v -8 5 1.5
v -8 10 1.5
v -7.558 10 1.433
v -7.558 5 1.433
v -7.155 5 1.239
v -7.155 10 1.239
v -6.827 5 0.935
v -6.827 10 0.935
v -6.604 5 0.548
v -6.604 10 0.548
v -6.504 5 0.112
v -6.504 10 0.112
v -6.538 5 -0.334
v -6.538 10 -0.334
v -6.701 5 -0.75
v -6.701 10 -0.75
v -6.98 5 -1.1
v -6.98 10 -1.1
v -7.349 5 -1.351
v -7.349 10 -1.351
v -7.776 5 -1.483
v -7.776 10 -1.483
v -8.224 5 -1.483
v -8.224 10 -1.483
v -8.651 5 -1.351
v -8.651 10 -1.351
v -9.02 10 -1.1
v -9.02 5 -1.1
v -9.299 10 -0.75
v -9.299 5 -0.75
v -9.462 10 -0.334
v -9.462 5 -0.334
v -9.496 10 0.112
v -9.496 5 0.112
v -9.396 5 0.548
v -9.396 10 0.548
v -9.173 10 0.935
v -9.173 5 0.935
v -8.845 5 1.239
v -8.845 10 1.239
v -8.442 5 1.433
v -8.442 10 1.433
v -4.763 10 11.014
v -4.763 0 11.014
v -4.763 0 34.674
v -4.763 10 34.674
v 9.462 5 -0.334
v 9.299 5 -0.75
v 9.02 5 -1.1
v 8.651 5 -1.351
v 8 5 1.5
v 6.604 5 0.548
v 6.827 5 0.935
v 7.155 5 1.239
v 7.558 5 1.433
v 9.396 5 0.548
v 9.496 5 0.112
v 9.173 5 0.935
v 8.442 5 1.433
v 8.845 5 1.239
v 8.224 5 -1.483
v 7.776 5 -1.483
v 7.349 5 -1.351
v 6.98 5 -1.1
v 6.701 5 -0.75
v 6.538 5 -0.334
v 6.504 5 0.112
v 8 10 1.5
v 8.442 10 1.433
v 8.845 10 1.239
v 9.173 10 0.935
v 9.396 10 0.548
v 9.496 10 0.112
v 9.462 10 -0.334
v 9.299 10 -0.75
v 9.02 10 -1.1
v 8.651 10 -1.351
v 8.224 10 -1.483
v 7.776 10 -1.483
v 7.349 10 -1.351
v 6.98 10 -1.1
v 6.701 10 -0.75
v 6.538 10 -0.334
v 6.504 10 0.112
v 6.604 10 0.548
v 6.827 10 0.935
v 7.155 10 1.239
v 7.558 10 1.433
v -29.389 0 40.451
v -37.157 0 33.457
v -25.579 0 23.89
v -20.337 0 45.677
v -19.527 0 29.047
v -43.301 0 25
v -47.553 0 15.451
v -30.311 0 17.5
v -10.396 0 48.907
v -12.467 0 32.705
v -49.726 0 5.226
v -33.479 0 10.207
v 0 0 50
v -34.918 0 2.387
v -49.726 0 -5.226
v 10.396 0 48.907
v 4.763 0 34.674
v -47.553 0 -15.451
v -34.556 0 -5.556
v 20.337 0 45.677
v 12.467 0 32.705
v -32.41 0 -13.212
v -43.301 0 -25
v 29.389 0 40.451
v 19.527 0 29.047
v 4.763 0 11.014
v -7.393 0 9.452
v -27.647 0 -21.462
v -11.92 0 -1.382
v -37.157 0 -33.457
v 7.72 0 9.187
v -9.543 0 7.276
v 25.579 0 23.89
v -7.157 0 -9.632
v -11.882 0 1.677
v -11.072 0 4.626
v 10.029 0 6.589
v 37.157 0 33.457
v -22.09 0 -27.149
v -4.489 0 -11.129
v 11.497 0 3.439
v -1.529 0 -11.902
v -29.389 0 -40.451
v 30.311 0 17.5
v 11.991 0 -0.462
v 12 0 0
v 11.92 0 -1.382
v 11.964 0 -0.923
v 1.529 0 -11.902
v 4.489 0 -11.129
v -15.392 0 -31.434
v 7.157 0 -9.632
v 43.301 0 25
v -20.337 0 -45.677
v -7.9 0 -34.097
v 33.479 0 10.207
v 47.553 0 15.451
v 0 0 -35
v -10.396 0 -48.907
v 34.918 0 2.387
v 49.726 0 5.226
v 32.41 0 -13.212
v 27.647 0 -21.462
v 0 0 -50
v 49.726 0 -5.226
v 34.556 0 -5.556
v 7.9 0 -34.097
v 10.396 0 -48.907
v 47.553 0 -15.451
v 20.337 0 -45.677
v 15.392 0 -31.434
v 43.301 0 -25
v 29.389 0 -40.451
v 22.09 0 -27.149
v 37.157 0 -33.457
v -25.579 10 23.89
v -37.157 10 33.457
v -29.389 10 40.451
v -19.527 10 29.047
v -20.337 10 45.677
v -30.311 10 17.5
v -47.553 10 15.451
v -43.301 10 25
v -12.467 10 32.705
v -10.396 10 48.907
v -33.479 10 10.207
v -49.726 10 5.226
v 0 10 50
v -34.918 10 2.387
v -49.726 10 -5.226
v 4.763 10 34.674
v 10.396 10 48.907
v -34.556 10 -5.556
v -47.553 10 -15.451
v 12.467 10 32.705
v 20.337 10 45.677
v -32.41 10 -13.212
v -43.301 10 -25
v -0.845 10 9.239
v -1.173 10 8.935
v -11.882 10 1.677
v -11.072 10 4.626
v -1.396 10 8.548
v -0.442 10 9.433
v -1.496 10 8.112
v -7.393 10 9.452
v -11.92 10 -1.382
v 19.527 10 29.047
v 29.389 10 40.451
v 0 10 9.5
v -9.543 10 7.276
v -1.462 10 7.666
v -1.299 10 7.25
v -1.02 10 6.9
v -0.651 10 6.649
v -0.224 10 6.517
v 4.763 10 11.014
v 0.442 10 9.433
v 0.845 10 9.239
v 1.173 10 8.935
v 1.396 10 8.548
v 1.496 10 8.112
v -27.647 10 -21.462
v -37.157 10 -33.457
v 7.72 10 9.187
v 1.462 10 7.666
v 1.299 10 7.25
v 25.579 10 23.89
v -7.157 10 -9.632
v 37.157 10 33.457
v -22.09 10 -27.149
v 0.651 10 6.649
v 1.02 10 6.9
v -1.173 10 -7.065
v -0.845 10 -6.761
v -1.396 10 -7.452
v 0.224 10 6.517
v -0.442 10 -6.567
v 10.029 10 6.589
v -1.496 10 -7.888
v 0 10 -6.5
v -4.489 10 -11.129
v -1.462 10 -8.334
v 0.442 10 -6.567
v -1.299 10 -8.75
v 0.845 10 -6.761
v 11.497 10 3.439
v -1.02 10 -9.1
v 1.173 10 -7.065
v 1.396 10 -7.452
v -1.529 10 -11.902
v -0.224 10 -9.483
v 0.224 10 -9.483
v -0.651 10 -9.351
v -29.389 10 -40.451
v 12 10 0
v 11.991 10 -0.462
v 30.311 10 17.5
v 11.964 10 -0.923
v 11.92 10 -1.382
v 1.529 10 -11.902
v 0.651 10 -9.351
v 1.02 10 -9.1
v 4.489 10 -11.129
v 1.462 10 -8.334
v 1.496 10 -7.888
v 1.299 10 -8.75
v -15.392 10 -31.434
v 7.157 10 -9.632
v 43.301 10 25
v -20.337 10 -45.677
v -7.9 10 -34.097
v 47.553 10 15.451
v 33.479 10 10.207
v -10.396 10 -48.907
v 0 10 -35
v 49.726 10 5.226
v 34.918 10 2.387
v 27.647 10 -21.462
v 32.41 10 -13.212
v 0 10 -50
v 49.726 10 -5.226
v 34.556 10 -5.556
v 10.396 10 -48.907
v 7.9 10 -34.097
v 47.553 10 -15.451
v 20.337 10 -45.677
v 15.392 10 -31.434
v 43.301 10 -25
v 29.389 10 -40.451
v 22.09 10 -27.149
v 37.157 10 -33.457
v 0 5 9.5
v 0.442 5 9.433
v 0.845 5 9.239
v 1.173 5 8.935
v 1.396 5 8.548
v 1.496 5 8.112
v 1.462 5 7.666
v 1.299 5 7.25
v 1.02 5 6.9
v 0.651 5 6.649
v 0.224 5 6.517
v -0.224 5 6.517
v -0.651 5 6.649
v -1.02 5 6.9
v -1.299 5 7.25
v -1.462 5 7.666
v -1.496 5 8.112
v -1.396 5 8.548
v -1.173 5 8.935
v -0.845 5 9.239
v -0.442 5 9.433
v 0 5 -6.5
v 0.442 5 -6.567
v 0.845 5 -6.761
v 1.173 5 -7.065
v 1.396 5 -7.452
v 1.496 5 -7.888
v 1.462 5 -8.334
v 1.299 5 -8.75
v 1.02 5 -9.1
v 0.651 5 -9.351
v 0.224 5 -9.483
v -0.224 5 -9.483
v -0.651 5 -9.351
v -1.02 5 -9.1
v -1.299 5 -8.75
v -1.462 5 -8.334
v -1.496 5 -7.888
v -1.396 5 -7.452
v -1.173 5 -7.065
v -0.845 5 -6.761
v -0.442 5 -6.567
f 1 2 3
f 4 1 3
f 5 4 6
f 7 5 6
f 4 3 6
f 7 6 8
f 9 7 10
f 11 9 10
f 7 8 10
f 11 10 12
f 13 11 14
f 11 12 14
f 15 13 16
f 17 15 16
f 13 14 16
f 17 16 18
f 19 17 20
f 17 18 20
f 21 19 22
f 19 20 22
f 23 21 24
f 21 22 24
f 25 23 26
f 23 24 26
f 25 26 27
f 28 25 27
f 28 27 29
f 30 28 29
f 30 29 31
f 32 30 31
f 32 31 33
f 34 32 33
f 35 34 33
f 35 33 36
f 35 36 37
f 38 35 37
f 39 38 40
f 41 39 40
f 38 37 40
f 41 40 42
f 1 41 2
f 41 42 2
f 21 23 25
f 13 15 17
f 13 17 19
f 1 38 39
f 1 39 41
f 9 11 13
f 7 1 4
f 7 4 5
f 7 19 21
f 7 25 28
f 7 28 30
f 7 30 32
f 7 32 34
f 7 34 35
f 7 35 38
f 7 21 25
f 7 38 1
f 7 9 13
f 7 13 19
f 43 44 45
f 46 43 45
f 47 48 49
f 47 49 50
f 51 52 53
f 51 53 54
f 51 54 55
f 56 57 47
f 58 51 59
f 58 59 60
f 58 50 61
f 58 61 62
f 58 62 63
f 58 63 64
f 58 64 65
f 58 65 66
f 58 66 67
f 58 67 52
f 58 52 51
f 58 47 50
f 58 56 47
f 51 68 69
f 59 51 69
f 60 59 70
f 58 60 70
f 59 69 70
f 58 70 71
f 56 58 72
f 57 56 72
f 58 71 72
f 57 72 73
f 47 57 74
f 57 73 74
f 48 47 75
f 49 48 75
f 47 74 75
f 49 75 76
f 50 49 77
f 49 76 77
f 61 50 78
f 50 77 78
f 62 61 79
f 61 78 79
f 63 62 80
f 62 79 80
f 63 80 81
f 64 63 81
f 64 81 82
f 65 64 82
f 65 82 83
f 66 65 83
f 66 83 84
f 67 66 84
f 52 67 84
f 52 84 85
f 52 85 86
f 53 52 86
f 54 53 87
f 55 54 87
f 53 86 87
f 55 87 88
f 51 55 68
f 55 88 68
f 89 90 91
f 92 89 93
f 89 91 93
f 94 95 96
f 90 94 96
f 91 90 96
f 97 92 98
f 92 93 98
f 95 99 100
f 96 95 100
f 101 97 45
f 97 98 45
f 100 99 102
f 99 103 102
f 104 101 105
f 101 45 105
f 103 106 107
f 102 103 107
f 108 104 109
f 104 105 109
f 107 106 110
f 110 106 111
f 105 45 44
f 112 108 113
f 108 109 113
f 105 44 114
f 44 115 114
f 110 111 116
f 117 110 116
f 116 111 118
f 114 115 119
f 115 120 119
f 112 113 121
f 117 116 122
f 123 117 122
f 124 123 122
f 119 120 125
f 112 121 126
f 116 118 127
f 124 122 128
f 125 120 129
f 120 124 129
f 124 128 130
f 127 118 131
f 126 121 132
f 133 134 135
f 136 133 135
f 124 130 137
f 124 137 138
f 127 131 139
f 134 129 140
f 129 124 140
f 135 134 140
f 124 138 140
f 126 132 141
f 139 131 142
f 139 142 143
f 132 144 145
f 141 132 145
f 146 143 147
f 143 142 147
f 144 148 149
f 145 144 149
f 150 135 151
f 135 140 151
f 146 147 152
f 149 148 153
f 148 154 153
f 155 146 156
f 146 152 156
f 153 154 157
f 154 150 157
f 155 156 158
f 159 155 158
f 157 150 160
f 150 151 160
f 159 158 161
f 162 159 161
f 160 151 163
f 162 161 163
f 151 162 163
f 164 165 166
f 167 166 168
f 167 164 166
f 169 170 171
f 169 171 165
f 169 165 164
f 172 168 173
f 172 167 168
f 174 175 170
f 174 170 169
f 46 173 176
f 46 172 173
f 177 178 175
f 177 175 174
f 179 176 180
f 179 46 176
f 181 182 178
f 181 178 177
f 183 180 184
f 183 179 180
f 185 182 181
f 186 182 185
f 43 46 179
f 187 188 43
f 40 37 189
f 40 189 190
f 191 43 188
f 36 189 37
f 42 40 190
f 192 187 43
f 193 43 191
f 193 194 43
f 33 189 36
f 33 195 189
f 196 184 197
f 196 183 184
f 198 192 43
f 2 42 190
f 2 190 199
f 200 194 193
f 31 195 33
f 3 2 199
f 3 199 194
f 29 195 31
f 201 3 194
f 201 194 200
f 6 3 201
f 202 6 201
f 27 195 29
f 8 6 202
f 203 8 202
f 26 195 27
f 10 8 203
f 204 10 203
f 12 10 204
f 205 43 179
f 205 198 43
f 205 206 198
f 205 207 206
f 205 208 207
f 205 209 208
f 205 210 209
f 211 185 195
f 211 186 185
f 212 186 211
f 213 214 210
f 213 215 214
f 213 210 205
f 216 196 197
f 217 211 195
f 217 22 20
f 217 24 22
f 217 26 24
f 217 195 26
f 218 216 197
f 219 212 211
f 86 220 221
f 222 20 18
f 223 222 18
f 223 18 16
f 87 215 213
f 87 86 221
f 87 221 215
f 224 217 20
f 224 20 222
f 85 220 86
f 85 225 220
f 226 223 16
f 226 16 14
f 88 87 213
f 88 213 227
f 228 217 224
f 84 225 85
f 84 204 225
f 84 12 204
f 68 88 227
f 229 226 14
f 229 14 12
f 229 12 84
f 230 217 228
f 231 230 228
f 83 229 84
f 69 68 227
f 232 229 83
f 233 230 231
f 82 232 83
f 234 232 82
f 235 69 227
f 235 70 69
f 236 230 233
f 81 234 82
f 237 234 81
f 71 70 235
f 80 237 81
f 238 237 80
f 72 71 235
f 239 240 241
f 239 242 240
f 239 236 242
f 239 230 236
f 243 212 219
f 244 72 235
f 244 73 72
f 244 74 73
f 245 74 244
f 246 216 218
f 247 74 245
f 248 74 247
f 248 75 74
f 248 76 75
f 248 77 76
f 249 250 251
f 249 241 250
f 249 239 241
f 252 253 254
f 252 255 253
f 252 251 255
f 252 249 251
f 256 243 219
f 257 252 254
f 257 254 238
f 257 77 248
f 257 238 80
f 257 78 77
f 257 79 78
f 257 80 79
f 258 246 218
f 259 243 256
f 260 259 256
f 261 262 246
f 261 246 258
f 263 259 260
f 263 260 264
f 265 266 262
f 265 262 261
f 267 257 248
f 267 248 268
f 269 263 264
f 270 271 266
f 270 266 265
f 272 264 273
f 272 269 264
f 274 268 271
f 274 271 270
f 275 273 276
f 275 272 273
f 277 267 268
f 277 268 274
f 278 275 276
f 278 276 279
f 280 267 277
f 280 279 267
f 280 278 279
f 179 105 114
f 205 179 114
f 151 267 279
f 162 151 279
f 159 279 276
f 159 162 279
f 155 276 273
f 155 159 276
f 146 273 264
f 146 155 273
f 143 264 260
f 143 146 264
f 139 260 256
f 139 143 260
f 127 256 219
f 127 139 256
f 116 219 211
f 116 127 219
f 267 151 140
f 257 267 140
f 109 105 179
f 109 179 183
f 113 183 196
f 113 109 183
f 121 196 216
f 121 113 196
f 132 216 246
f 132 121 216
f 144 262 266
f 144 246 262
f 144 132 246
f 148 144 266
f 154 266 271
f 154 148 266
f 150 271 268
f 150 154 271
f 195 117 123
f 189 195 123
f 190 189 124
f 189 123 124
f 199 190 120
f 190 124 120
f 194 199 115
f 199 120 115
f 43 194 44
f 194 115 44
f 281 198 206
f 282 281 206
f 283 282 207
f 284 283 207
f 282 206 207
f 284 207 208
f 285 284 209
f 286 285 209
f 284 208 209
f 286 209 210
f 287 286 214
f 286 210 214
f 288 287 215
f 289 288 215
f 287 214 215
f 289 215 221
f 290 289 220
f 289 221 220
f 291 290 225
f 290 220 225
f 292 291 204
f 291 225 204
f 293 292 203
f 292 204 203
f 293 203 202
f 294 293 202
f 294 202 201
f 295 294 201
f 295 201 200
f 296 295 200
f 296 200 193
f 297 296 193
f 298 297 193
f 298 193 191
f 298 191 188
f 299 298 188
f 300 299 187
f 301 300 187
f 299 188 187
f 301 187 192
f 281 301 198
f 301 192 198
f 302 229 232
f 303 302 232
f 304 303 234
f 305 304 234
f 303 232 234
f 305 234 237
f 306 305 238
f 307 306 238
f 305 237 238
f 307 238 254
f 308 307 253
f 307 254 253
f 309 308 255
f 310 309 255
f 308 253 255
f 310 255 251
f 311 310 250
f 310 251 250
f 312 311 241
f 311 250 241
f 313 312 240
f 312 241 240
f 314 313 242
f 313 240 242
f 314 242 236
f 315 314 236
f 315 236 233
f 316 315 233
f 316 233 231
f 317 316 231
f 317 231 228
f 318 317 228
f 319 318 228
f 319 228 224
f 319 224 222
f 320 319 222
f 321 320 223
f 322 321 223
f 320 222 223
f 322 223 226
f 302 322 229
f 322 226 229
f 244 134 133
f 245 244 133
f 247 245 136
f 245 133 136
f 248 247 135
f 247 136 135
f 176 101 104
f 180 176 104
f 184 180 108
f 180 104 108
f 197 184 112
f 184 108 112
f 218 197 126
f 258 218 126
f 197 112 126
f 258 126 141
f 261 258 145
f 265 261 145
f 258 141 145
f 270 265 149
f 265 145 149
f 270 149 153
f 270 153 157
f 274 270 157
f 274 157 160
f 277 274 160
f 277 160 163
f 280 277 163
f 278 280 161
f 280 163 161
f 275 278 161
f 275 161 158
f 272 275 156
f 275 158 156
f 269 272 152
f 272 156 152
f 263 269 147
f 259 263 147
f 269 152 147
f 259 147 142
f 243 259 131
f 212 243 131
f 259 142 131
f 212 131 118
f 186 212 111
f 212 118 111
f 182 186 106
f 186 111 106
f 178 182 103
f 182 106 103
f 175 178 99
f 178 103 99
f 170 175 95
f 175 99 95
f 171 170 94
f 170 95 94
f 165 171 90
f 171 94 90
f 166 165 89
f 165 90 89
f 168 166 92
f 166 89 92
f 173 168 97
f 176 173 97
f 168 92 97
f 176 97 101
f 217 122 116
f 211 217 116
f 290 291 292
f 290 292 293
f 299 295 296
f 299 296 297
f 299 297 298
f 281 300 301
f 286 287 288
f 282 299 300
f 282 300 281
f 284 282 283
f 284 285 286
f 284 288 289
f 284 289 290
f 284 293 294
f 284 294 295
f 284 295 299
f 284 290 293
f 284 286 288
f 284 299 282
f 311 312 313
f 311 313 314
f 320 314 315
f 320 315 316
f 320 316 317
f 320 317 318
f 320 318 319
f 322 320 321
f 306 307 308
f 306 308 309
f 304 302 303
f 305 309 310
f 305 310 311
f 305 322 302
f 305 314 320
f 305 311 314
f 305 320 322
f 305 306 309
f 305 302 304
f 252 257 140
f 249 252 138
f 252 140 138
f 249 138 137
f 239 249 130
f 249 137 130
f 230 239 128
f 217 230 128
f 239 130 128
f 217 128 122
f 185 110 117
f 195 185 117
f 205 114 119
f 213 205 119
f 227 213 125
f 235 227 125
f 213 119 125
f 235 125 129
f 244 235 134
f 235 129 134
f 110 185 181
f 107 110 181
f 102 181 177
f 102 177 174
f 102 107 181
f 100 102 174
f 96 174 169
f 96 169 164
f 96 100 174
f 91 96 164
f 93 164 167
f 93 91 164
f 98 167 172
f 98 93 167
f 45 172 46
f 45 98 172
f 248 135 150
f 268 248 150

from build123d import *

# Parameters (mm, degrees)
SKETCH2_R           = 50
SKETCH2_R_2         = 35
SKETCH2_R_3         = 5.5
BOSS_EXTRUDE1_DEPTH = 10
SKETCH3_R           = 1.5
CUT_EXTRUDE1_DEPTH  = 5


with BuildPart() as part:
    # Sketch2 → Boss-Extrude1 (new body)
    # profile 1 of 11: a face of its own
    with BuildSketch(Plane(origin=(0, 0, 0), x_dir=(1, 0, 0), z_dir=(0, 1, 0))):
        with Locations(Location((0, 0, 0), (0, 0, 270))):
            Circle(SKETCH2_R)
        Circle(SKETCH2_R_2, mode=Mode.SUBTRACT)
    # profile 2 of 11: a face of its own
    with BuildSketch(Plane(origin=(0, 0, 0), x_dir=(1, 0, 0), z_dir=(0, 1, 0))):
        with BuildLine():
            ThreePointArc((-4.763139721, -2.75), (-4.763139721, 2.75), (0, 5.5))
            Line((0, 5.5), (-7.157003146, 9.632097693))
            ThreePointArc((-7.157003146, 9.632097693), (-10.392304845, 6), (-11.920142867, 1.382097693))
            Line((-11.920142867, 1.382097693), (-4.763139721, -2.75))
        make_face()
    # profile 3 of 11: a face of its own
    with BuildSketch(Plane(origin=(0, 0, 0), x_dir=(1, 0, 0), z_dir=(0, 1, 0))):
        with BuildLine():
            Line((-7.157003146, 9.632097693), (0, 5.5))
            Line((0, 5.5), (7.157003146, 9.632097693))
            ThreePointArc((7.157003146, 9.632097693), (0, 12), (-7.157003146, 9.632097693))
        make_face()
    # profile 4 of 11: a face of its own
    with BuildSketch(Plane(origin=(0, 0, 0), x_dir=(1, 0, 0), z_dir=(0, 1, 0))):
        with BuildLine():
            Line((7.157003146, 9.632097693), (0, 5.5))
            ThreePointArc((0, 5.5), (3.889087297, 3.889087297), (5.5, 0))
            ThreePointArc((5.5, 0), (5.312592045, -1.423504748), (4.763139721, -2.75))
            Line((4.763139721, -2.75), (11.920142867, 1.382097693))
            ThreePointArc((11.920142867, 1.382097693), (10.392304845, 6), (7.157003146, 9.632097693))
        make_face()
    # profile 5 of 11: a face of its own
    with BuildSketch(Plane(origin=(0, 0, 0), x_dir=(1, 0, 0), z_dir=(0, 1, 0))):
        with BuildLine():
            ThreePointArc((12, 0), (11.980019082, 0.692201415), (11.920142867, 1.382097693))
            Line((11.920142867, 1.382097693), (4.763139721, -2.75))
            Line((4.763139721, -2.75), (4.763139721, -11.014195386))
            ThreePointArc((4.763139721, -11.014195386), (10.028900155, -6.589473551), (12, 0))
        make_face()
    # profile 6 of 11: a face of its own
    with BuildSketch(Plane(origin=(0, 0, 0), x_dir=(1, 0, 0), z_dir=(0, 1, 0))):
        with BuildLine():
            ThreePointArc((4.763139721, -2.75), (0, -5.5), (-4.763139721, -2.75))
            Line((-4.763139721, -2.75), (-4.763139721, -11.014195386))
            ThreePointArc((-4.763139721, -11.014195386), (0, -12), (4.763139721, -11.014195386))
            Line((4.763139721, -11.014195386), (4.763139721, -2.75))
        make_face()
    # profile 7 of 11: a face of its own
    with BuildSketch(Plane(origin=(0, 0, 0), x_dir=(1, 0, 0), z_dir=(0, 1, 0))):
        with BuildLine():
            Line((-4.763139721, -11.014195386), (-4.763139721, -2.75))
            Line((-4.763139721, -2.75), (-11.920142867, 1.382097693))
            ThreePointArc((-11.920142867, 1.382097693), (-10.392304845, -6), (-4.763139721, -11.014195386))
        make_face()
    # profile 8 of 11: a face of its own
    with BuildSketch(Plane(origin=(0, 0, 0), x_dir=(1, 0, 0), z_dir=(0, 1, 0))):
        Circle(SKETCH2_R_3)
    # profile 9 of 11: a face of its own
    with BuildSketch(Plane(origin=(0, 0, 0), x_dir=(1, 0, 0), z_dir=(0, 1, 0))):
        with BuildLine():
            ThreePointArc((4.763139721, -11.014195386), (0, -12), (-4.763139721, -11.014195386))
            Line((-4.763139721, -11.014195386), (-4.763139721, -34.674378149))
            ThreePointArc((-4.763139721, -34.674378149), (0, -35), (4.763139721, -34.674378149))
            Line((4.763139721, -34.674378149), (4.763139721, -11.014195386))
        make_face()
    # profile 10 of 11: a face of its own
    with BuildSketch(Plane(origin=(0, 0, 0), x_dir=(1, 0, 0), z_dir=(0, 1, 0))):
        with BuildLine():
            ThreePointArc((-11.920142867, 1.382097693), (-10.392304845, 6), (-7.157003146, 9.632097693))
            Line((-7.157003146, 9.632097693), (-27.647322477, 21.462189074))
            ThreePointArc((-27.647322477, 21.462189074), (-30.310889132, 17.5), (-32.410462198, 13.212189074))
            Line((-32.410462198, 13.212189074), (-11.920142867, 1.382097693))
        make_face()
    # profile 11 of 11: a face of its own
    with BuildSketch(Plane(origin=(0, 0, 0), x_dir=(1, 0, 0), z_dir=(0, 1, 0))):
        with BuildLine():
            Line((27.647322477, 21.462189074), (7.157003146, 9.632097693))
            ThreePointArc((7.157003146, 9.632097693), (10.392304845, 6), (11.920142867, 1.382097693))
            Line((11.920142867, 1.382097693), (32.410462198, 13.212189074))
            ThreePointArc((32.410462198, 13.212189074), (30.310889132, 17.5), (27.647322477, 21.462189074))
        make_face()
    extrude(amount=BOSS_EXTRUDE1_DEPTH)

    # Sketch3 → Cut-Extrude1 (cut)
    with BuildSketch(Plane(origin=(0, 10, 0), x_dir=(1, 0, 0), z_dir=(0, 1, 0))):
        with Locations(Location((0, 8, 0), (0, 0, 270))):
            Circle(SKETCH3_R)
        with Locations(Location((8, 0, 0), (0, 0, 270))):
            Circle(SKETCH3_R)
        with Locations(Location((0, -8, 0), (0, 0, 270))):
            Circle(SKETCH3_R)
        with Locations(Location((-8, 0, 0), (0, 0, 270))):
            Circle(SKETCH3_R)
    extrude(amount=-CUT_EXTRUDE1_DEPTH, mode=Mode.SUBTRACT)


solid = part.part
